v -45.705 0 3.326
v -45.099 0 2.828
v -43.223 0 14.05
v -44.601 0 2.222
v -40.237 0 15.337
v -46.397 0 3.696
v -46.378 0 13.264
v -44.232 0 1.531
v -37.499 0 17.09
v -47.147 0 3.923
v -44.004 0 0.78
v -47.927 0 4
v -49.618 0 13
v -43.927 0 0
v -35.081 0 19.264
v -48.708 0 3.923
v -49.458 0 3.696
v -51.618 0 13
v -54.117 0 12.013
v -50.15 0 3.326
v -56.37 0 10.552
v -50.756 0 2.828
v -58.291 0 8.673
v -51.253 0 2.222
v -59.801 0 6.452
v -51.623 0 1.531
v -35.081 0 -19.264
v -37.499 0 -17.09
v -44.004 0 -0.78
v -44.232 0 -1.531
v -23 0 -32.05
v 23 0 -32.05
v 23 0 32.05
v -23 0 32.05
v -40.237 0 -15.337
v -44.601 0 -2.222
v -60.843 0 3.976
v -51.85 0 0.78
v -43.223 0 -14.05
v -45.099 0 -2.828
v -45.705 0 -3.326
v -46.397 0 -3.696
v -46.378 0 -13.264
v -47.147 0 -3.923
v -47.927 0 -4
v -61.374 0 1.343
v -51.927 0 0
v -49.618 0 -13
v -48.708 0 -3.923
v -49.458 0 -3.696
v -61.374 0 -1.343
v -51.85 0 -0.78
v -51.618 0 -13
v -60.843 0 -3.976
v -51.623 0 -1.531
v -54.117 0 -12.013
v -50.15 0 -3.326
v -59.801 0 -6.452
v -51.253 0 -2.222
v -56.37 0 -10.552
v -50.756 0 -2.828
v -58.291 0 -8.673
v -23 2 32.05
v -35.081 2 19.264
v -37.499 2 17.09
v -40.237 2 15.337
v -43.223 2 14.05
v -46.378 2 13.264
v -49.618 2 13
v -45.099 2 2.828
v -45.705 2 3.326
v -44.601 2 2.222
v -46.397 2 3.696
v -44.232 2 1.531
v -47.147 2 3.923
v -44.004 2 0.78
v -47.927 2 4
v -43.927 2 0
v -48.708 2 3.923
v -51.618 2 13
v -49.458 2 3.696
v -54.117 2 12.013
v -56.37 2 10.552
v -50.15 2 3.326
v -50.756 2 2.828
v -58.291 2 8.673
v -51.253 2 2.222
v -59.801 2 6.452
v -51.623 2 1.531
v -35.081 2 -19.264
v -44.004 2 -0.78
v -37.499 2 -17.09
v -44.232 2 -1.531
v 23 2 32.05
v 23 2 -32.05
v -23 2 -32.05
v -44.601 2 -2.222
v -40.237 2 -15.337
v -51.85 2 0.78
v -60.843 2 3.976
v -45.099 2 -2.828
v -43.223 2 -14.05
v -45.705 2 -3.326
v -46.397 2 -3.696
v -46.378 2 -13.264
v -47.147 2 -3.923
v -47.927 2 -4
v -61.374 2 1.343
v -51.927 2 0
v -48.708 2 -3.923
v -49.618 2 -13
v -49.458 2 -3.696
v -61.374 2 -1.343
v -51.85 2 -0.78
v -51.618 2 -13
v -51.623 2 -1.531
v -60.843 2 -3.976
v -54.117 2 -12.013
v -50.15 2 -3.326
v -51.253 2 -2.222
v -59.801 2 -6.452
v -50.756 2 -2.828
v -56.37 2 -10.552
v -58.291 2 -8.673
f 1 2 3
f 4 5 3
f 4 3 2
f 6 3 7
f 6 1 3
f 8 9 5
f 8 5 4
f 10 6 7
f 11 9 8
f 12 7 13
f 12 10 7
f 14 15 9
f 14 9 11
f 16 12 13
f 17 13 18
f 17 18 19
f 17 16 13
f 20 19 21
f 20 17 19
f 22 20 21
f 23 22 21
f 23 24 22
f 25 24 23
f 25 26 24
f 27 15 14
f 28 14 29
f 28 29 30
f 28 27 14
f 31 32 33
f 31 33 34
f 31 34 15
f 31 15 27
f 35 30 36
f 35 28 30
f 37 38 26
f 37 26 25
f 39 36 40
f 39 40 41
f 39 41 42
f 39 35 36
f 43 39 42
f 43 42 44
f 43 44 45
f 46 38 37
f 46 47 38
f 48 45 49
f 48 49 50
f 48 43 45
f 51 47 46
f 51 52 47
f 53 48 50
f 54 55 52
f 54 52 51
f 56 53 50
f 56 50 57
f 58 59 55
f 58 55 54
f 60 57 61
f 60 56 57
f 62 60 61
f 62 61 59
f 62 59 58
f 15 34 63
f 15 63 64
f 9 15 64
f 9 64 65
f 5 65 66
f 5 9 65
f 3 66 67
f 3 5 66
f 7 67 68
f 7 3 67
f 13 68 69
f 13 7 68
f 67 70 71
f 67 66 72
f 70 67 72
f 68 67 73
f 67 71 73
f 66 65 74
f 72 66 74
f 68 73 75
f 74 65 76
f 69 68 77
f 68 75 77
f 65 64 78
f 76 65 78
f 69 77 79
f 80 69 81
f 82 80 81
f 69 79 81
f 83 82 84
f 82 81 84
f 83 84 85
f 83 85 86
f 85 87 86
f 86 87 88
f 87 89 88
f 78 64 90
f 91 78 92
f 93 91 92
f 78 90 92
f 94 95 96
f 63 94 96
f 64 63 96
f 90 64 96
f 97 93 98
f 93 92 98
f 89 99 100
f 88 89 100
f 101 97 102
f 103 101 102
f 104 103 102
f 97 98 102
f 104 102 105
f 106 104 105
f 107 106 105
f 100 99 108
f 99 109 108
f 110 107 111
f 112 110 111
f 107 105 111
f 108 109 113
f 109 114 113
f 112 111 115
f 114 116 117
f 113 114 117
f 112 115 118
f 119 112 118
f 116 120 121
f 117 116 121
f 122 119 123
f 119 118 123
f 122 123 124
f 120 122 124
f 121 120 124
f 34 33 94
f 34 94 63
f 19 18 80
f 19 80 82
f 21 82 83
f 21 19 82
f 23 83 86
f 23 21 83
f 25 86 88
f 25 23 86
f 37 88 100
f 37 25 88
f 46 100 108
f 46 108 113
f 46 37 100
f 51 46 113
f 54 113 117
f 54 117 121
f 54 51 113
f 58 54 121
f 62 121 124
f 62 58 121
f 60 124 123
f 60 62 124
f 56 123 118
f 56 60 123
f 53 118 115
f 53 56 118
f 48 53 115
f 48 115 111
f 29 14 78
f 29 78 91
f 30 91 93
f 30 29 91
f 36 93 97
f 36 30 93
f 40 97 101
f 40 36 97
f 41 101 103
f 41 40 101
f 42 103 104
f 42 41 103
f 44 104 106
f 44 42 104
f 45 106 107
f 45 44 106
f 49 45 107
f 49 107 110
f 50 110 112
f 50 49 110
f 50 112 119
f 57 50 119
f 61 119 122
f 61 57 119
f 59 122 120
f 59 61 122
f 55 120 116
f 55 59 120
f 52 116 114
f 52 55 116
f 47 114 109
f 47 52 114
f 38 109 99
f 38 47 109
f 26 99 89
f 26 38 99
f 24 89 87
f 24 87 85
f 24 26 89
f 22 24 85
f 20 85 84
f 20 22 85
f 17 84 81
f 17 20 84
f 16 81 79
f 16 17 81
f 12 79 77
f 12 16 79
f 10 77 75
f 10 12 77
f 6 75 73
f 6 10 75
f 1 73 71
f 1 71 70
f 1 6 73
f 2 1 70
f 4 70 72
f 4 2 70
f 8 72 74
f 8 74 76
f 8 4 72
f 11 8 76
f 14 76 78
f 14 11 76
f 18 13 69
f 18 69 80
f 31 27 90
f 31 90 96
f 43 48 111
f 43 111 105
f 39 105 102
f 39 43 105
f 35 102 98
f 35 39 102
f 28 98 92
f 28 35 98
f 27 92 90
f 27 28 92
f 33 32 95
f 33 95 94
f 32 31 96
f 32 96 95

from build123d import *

# Parameters (mm, degrees)
SKETCH_1_R      = 4
EXTRUDE_1_DEPTH = 2


with BuildPart() as part:
    # 草图1 → 凸台-拉伸1 (new body)
    with BuildSketch(Plane(origin=(0, 0, 0), x_dir=(1, 0, 0), z_dir=(0, 1, 0))):
        with BuildLine():
            Line((-49.618188819, -13), (-51.618188819, -13))
            ThreePointArc((-51.618188819, -13), (-61.441082992, 0), (-51.618188819, 13))
            Line((-51.618188819, 13), (-49.618188819, 13))
            ThreePointArc((-49.618188819, 13), (-41.703538748, 14.632683531), (-35.08110056, 19.264168574))
            Line((-35.08110056, 19.264168574), (-23, 32.05))
            Line((-23, 32.05), (23, 32.05))
            Line((23, 32.05), (23, -32.05))
            Line((23, -32.05), (-23, -32.05))
            Line((-23, -32.05), (-35.08110056, -19.264168574))
            ThreePointArc((-35.08110056, -19.264168574), (-41.703538748, -14.632683531), (-49.618188819, -13))
        make_face()
        with Locations((-47.927283228, 0)):
            Circle(SKETCH_1_R, mode=Mode.SUBTRACT)
    extrude(amount=EXTRUDE_1_DEPTH)


solid = part.part
